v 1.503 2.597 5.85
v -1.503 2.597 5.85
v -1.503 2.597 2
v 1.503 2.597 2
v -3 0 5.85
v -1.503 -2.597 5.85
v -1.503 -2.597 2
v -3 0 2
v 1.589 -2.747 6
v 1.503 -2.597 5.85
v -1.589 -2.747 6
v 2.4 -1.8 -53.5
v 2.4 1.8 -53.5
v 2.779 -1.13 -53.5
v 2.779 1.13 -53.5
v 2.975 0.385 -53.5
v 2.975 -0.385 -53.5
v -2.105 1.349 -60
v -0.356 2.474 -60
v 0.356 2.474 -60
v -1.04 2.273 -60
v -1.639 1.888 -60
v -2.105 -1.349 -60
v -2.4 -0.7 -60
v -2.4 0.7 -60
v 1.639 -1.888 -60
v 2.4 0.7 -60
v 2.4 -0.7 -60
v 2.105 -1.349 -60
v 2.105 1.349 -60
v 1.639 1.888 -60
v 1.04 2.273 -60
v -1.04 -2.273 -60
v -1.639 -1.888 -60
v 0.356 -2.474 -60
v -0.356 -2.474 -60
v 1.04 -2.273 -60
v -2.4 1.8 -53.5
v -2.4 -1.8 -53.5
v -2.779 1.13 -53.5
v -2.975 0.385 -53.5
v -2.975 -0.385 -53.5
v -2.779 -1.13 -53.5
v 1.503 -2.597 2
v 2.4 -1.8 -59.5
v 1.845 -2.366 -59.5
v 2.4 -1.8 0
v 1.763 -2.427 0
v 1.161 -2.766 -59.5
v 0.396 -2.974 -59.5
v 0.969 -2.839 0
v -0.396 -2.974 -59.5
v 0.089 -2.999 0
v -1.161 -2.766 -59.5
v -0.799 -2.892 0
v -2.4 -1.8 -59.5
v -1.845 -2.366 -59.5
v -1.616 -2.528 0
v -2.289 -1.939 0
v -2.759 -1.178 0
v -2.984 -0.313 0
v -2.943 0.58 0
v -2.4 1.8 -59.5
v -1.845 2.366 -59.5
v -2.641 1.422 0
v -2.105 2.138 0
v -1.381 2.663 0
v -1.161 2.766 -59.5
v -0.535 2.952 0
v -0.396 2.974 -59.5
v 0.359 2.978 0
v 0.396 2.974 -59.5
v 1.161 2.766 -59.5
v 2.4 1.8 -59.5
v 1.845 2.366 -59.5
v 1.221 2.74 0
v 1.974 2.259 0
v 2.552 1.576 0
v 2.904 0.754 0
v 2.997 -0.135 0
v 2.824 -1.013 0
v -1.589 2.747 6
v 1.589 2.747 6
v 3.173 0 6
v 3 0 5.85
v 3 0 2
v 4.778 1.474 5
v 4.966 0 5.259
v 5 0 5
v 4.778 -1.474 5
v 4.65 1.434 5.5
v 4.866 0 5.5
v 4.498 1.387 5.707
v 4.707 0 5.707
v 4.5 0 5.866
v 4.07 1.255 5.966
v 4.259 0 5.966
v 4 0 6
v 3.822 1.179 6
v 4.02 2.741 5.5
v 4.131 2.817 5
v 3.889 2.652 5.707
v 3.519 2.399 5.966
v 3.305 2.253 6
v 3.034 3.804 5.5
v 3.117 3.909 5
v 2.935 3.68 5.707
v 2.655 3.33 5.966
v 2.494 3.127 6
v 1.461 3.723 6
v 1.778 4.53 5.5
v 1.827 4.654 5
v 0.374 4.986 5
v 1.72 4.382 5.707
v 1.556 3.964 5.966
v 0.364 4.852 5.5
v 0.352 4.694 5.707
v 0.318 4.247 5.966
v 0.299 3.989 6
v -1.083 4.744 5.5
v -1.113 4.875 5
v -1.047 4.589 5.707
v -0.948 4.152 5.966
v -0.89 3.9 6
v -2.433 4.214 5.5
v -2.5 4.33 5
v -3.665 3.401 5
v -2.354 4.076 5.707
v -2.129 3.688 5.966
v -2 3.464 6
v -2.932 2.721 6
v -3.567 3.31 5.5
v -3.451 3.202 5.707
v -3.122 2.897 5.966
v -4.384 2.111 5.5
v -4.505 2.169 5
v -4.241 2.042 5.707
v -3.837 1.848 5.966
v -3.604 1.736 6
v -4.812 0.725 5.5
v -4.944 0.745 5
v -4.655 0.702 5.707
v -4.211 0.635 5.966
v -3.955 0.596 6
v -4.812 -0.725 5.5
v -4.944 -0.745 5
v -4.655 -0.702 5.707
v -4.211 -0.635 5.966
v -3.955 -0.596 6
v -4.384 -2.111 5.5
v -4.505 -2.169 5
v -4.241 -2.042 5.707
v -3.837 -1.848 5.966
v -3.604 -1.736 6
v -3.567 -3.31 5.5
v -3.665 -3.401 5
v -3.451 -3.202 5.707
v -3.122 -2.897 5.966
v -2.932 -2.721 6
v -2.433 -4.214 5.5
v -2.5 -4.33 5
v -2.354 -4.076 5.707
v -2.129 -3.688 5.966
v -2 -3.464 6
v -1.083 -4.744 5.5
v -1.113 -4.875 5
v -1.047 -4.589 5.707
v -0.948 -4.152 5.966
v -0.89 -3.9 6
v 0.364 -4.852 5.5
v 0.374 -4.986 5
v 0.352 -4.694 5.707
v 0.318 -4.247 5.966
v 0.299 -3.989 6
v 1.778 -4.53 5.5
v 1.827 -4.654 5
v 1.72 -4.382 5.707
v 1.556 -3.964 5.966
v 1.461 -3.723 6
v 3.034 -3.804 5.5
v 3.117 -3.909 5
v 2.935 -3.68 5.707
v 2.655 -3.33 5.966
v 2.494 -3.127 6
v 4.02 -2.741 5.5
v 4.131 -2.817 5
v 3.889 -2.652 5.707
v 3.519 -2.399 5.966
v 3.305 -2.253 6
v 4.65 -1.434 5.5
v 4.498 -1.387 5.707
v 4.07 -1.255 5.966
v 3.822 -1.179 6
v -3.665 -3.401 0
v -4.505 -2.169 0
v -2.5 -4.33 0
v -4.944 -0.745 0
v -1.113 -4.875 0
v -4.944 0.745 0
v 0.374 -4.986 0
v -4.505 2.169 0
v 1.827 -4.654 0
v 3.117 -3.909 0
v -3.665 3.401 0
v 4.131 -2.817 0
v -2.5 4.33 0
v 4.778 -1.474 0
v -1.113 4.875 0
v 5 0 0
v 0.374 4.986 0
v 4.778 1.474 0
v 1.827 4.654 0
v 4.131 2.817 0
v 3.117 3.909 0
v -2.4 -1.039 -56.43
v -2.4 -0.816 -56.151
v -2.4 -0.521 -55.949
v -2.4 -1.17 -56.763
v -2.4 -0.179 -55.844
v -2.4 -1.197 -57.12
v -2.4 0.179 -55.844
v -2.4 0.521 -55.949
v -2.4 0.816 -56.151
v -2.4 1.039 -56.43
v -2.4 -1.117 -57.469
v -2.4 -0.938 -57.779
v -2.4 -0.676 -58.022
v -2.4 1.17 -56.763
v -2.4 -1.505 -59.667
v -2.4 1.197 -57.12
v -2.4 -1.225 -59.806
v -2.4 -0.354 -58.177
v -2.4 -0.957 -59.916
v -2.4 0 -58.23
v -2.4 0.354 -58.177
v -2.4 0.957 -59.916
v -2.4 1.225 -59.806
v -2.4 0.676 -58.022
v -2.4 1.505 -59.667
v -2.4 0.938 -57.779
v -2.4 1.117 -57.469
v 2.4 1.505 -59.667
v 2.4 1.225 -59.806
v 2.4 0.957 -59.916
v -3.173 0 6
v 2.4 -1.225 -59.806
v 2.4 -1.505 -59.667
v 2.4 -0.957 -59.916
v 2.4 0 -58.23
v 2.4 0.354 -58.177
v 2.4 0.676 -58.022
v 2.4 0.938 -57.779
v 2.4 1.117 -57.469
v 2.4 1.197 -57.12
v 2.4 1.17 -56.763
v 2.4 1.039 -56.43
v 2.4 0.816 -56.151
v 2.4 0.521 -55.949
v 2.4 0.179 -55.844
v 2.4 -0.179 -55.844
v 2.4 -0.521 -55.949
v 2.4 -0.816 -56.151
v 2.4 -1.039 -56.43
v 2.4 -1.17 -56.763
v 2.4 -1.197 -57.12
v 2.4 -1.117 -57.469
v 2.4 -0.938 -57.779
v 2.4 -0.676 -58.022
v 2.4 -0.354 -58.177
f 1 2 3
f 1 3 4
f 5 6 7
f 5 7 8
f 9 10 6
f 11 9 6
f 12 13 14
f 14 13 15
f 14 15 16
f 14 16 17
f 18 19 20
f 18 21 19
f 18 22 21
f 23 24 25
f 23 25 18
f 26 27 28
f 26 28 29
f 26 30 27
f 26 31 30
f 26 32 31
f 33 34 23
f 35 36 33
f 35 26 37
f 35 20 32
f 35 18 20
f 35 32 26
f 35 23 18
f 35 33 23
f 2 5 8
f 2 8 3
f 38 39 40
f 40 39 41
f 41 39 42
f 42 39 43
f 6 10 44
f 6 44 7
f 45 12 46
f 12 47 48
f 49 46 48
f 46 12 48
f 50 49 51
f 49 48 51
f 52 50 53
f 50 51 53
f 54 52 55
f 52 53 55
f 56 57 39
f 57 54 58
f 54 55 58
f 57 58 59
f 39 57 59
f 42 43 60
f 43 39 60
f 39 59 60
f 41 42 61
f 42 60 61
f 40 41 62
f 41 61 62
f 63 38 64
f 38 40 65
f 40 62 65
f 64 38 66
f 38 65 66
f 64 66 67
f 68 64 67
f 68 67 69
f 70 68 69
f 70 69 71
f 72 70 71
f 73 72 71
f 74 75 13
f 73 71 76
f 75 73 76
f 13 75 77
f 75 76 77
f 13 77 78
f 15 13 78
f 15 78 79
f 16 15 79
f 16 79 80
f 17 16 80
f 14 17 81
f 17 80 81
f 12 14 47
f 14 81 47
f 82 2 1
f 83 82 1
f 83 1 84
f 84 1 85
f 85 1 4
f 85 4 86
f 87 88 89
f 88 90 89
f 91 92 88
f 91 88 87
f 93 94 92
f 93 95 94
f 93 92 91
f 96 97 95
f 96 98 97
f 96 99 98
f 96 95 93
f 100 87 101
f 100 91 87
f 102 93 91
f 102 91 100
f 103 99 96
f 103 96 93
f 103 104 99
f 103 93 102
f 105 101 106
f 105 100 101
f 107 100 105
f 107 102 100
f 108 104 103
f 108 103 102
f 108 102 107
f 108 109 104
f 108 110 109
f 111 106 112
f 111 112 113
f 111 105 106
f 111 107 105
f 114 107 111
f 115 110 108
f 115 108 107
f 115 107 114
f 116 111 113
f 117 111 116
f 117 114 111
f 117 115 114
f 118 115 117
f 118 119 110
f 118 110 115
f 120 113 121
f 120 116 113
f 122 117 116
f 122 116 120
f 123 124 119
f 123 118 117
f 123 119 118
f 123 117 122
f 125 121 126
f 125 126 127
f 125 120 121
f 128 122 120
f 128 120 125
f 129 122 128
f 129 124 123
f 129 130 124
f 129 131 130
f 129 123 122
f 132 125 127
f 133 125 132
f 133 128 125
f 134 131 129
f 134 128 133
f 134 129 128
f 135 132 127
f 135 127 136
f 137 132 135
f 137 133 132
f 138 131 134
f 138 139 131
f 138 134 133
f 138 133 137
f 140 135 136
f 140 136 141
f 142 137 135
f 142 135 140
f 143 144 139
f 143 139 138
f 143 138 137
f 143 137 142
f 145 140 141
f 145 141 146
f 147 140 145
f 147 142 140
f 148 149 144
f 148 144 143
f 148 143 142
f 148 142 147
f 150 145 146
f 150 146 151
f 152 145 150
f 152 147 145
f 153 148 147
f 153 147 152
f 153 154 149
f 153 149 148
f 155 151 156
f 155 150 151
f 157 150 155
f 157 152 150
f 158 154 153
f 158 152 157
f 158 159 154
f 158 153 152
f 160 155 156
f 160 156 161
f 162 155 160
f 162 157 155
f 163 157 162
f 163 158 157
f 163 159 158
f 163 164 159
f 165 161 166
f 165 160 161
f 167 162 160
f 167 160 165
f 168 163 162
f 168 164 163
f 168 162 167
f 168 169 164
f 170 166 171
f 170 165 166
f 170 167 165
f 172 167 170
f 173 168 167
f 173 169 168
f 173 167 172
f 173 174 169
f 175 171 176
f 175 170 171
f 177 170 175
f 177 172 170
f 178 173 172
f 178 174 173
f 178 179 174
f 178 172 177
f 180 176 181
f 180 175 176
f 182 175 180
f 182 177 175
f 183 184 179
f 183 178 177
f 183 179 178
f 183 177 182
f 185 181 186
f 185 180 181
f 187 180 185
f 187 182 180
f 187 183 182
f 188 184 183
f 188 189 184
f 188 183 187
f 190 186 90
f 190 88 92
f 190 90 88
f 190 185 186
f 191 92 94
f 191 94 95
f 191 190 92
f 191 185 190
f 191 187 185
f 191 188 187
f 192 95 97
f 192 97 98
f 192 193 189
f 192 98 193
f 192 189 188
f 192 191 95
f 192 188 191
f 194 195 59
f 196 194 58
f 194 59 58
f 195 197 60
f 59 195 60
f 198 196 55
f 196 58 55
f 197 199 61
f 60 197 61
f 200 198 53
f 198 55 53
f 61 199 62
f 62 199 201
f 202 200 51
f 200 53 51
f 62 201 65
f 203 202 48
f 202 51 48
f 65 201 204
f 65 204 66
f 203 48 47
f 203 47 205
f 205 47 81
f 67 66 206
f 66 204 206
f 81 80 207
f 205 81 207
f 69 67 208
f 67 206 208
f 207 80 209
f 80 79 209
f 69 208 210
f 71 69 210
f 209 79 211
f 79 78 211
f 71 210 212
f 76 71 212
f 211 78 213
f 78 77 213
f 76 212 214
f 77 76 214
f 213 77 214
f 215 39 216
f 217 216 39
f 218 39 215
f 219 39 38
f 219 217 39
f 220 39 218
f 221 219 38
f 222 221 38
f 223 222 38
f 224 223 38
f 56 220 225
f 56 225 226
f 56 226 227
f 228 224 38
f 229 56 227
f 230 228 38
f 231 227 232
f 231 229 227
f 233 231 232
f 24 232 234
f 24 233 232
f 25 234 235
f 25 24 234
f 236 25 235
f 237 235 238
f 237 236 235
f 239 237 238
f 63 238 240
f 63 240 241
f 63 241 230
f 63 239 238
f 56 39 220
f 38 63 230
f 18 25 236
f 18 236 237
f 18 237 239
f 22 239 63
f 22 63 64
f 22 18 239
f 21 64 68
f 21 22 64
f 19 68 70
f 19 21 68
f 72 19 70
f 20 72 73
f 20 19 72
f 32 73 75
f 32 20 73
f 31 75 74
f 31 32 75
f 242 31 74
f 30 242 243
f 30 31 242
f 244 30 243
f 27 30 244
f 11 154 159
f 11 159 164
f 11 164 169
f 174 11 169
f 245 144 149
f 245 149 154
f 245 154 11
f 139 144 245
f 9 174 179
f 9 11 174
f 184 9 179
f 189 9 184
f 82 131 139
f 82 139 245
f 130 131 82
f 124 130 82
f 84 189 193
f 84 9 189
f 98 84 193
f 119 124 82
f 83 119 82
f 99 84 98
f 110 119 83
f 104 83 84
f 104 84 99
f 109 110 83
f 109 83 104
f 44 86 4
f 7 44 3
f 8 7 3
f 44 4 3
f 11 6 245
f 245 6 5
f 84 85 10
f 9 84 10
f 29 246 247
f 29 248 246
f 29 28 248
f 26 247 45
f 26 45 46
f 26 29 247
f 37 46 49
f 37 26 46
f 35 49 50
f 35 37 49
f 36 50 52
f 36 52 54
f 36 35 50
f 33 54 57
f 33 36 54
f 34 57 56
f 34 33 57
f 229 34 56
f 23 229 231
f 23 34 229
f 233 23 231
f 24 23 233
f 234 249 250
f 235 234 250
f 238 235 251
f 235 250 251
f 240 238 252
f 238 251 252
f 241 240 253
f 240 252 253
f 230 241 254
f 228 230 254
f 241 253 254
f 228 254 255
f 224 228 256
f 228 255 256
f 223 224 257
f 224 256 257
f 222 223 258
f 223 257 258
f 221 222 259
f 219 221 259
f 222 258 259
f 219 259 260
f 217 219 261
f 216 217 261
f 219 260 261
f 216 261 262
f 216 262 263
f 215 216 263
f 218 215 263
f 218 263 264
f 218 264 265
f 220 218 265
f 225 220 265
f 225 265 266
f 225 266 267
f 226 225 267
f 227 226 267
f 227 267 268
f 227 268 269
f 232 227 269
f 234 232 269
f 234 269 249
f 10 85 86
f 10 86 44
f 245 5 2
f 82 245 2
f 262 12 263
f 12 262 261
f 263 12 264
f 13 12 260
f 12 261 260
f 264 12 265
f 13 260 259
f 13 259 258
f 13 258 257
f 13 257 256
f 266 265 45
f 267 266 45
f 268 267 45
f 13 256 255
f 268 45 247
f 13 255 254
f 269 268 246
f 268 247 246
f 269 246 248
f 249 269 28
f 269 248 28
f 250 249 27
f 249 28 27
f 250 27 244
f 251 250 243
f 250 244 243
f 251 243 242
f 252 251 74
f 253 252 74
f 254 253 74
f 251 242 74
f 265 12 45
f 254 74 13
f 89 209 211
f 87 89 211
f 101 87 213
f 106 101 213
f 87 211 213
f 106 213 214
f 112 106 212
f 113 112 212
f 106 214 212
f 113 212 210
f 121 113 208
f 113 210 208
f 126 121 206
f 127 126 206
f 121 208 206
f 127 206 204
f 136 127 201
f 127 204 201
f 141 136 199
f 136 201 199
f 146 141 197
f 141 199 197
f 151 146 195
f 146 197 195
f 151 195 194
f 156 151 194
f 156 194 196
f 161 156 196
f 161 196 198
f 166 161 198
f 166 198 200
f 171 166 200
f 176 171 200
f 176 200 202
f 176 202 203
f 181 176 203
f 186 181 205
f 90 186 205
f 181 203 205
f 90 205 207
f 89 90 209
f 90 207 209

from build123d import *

# Parameters (mm, degrees)
ESQUISSE1_R             = 5
BASE_EXTRUSION_DEPTH    = 6
ENL_V_MAT_EXTRU_1_DEPTH = 4
CONG_1_R                = 1
CHANFREIN3_SIZE         = 0.15
ESQUISSE4_R             = 3
BOSS_EXTRU_1_DEPTH      = 60
CHANFREIN4_SIZE         = 0.5
ESQUISSE5_W             = 1.725795971
ESQUISSE5_H             = 5.746530977
ENL_V_MAT_EXTRU_2_DEPTH = 6.5
ESQUISSE6_W             = 1.6
ESQUISSE6_H             = 6
ENL_V_MAT_EXTRU_3_DEPTH = 6.5
ESQUISSE7_R             = 1.2
ENL_V_MAT_EXTRU_4_DEPTH = 61.661025379


with BuildPart() as part:
    # Esquisse1 → Base-Extrusion (new body)
    with BuildSketch(Plane.XY):
        Circle(ESQUISSE1_R)
    extrude(amount=BASE_EXTRUSION_DEPTH)

    # Esquisse3 → Enlèv. mat.-Extru.1 (cut)
    with BuildSketch(Plane.XY.offset(6)):
        Polygon((-3, 0), (-1.502673246, 2.596530977), (1.502673246, 2.596530977), (3, 0), (1.502673246, -2.596530977), (-1.502673246, -2.596530977), align=None)
    extrude(amount=-ENL_V_MAT_EXTRU_1_DEPTH, mode=Mode.SUBTRACT)

    # Congé1
    cong_1_edges = [part.edges().sort_by_distance(p)[0] for p in [
        (-5, 0, 6),
    ]]
    fillet(cong_1_edges, radius=CONG_1_R)

    # Chanfrein3
    chanfrein3_edges = [part.edges().sort_by_distance(p)[0] for p in [
        (-2.251336623, -1.298265489, 6),
        (0, -2.596530977, 6),
        (2.251336623, -1.298265489, 6),
        (2.251336623, 1.298265489, 6),
        (0, 2.596530977, 6),
        (-2.251336623, 1.298265489, 6),
    ]]
    chamfer(chanfrein3_edges, length=CHANFREIN3_SIZE)

    # Esquisse4 → Boss.-Extru.1 (add)
    with BuildSketch(Plane(origin=(0, 0, 0), x_dir=(-1, 0, 0), z_dir=(0, 0, -1))):
        with Locations(Location((0, 0, 0), (0, 0, 216.869897646))):
            Circle(ESQUISSE4_R)
    extrude(amount=BOSS_EXTRU_1_DEPTH)

    # Chanfrein4
    chanfrein4_edges = [part.edges().sort_by_distance(p)[0] for p in [
        (-2.4, 1.8, -60),
    ]]
    chamfer(chanfrein4_edges, length=CHANFREIN4_SIZE)

    # Esquisse5 → Enlèv. mat.-Extru.2 (cut)
    with BuildSketch(Plane(origin=(0, 0, -60), x_dir=(-1, 0, 0), z_dir=(0, 0, -1))):
        with Locations((-3.262897986, 0.126734511)):
            Rectangle(ESQUISSE5_W, ESQUISSE5_H)
    extrude(amount=-ENL_V_MAT_EXTRU_2_DEPTH, mode=Mode.SUBTRACT)

    # Esquisse6 → Enlèv. mat.-Extru.3 (cut)
    with BuildSketch(Plane(origin=(0, 0, -60), x_dir=(-1, 0, 0), z_dir=(0, 0, -1))):
        with Locations((3.2, 0)):
            Rectangle(ESQUISSE6_W, ESQUISSE6_H)
    extrude(amount=-ENL_V_MAT_EXTRU_3_DEPTH, mode=Mode.SUBTRACT)

    # Esquisse7 → Enlèv. mat.-Extru.4 (cut, through all)
    with BuildSketch(Plane(origin=(2.4, 0, 0), x_dir=(0, 0, -1), z_dir=(1, 0, 0))):
        with Locations((57.030411383, 0)):
            Circle(ESQUISSE7_R)
    extrude(amount=-ENL_V_MAT_EXTRU_4_DEPTH, mode=Mode.SUBTRACT)


solid = part.part
